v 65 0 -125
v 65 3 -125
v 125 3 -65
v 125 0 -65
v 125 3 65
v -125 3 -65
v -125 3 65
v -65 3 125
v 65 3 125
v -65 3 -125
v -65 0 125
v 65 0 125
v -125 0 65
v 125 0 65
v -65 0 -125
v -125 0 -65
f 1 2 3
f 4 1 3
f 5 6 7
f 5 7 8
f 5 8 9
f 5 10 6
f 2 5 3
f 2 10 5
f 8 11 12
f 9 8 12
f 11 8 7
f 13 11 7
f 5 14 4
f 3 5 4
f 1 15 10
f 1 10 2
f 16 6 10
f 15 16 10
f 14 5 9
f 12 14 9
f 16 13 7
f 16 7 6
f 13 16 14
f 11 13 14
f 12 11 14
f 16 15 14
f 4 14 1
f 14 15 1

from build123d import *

# Parameters (mm, degrees)
ESQUISSE1_W       = 250
ESQUISSE1_H       = 250
EXTRUSION1_DEPTH  = 3
EXTRUSION11_DEPTH = 13


with BuildPart() as part:
    # Esquisse1 → Extrusion1 (new body)
    with BuildSketch(Plane(origin=(0, 0, 0), x_dir=(1, 0, 0), z_dir=(0, 1, 0))):
        Rectangle(ESQUISSE1_W, ESQUISSE1_H)
    extrude(amount=EXTRUSION1_DEPTH)

    # Esquisse2 → Extrusion11 (cut)
    with BuildSketch(Plane(origin=(0, 3, 0), x_dir=(1, 0, 0), z_dir=(0, 1, 0))):
        Polygon((-125, 125), (-125, 65), (-65, 125), align=None)
        Polygon((125, 125), (65, 125), (125, 65), align=None)
        Polygon((125, -65), (65, -125), (125, -125), align=None)
        Polygon((-65, -125), (-125, -65), (-125, -125), align=None)
    extrude(amount=-EXTRUSION11_DEPTH, mode=Mode.SUBTRACT)


solid = part.part
